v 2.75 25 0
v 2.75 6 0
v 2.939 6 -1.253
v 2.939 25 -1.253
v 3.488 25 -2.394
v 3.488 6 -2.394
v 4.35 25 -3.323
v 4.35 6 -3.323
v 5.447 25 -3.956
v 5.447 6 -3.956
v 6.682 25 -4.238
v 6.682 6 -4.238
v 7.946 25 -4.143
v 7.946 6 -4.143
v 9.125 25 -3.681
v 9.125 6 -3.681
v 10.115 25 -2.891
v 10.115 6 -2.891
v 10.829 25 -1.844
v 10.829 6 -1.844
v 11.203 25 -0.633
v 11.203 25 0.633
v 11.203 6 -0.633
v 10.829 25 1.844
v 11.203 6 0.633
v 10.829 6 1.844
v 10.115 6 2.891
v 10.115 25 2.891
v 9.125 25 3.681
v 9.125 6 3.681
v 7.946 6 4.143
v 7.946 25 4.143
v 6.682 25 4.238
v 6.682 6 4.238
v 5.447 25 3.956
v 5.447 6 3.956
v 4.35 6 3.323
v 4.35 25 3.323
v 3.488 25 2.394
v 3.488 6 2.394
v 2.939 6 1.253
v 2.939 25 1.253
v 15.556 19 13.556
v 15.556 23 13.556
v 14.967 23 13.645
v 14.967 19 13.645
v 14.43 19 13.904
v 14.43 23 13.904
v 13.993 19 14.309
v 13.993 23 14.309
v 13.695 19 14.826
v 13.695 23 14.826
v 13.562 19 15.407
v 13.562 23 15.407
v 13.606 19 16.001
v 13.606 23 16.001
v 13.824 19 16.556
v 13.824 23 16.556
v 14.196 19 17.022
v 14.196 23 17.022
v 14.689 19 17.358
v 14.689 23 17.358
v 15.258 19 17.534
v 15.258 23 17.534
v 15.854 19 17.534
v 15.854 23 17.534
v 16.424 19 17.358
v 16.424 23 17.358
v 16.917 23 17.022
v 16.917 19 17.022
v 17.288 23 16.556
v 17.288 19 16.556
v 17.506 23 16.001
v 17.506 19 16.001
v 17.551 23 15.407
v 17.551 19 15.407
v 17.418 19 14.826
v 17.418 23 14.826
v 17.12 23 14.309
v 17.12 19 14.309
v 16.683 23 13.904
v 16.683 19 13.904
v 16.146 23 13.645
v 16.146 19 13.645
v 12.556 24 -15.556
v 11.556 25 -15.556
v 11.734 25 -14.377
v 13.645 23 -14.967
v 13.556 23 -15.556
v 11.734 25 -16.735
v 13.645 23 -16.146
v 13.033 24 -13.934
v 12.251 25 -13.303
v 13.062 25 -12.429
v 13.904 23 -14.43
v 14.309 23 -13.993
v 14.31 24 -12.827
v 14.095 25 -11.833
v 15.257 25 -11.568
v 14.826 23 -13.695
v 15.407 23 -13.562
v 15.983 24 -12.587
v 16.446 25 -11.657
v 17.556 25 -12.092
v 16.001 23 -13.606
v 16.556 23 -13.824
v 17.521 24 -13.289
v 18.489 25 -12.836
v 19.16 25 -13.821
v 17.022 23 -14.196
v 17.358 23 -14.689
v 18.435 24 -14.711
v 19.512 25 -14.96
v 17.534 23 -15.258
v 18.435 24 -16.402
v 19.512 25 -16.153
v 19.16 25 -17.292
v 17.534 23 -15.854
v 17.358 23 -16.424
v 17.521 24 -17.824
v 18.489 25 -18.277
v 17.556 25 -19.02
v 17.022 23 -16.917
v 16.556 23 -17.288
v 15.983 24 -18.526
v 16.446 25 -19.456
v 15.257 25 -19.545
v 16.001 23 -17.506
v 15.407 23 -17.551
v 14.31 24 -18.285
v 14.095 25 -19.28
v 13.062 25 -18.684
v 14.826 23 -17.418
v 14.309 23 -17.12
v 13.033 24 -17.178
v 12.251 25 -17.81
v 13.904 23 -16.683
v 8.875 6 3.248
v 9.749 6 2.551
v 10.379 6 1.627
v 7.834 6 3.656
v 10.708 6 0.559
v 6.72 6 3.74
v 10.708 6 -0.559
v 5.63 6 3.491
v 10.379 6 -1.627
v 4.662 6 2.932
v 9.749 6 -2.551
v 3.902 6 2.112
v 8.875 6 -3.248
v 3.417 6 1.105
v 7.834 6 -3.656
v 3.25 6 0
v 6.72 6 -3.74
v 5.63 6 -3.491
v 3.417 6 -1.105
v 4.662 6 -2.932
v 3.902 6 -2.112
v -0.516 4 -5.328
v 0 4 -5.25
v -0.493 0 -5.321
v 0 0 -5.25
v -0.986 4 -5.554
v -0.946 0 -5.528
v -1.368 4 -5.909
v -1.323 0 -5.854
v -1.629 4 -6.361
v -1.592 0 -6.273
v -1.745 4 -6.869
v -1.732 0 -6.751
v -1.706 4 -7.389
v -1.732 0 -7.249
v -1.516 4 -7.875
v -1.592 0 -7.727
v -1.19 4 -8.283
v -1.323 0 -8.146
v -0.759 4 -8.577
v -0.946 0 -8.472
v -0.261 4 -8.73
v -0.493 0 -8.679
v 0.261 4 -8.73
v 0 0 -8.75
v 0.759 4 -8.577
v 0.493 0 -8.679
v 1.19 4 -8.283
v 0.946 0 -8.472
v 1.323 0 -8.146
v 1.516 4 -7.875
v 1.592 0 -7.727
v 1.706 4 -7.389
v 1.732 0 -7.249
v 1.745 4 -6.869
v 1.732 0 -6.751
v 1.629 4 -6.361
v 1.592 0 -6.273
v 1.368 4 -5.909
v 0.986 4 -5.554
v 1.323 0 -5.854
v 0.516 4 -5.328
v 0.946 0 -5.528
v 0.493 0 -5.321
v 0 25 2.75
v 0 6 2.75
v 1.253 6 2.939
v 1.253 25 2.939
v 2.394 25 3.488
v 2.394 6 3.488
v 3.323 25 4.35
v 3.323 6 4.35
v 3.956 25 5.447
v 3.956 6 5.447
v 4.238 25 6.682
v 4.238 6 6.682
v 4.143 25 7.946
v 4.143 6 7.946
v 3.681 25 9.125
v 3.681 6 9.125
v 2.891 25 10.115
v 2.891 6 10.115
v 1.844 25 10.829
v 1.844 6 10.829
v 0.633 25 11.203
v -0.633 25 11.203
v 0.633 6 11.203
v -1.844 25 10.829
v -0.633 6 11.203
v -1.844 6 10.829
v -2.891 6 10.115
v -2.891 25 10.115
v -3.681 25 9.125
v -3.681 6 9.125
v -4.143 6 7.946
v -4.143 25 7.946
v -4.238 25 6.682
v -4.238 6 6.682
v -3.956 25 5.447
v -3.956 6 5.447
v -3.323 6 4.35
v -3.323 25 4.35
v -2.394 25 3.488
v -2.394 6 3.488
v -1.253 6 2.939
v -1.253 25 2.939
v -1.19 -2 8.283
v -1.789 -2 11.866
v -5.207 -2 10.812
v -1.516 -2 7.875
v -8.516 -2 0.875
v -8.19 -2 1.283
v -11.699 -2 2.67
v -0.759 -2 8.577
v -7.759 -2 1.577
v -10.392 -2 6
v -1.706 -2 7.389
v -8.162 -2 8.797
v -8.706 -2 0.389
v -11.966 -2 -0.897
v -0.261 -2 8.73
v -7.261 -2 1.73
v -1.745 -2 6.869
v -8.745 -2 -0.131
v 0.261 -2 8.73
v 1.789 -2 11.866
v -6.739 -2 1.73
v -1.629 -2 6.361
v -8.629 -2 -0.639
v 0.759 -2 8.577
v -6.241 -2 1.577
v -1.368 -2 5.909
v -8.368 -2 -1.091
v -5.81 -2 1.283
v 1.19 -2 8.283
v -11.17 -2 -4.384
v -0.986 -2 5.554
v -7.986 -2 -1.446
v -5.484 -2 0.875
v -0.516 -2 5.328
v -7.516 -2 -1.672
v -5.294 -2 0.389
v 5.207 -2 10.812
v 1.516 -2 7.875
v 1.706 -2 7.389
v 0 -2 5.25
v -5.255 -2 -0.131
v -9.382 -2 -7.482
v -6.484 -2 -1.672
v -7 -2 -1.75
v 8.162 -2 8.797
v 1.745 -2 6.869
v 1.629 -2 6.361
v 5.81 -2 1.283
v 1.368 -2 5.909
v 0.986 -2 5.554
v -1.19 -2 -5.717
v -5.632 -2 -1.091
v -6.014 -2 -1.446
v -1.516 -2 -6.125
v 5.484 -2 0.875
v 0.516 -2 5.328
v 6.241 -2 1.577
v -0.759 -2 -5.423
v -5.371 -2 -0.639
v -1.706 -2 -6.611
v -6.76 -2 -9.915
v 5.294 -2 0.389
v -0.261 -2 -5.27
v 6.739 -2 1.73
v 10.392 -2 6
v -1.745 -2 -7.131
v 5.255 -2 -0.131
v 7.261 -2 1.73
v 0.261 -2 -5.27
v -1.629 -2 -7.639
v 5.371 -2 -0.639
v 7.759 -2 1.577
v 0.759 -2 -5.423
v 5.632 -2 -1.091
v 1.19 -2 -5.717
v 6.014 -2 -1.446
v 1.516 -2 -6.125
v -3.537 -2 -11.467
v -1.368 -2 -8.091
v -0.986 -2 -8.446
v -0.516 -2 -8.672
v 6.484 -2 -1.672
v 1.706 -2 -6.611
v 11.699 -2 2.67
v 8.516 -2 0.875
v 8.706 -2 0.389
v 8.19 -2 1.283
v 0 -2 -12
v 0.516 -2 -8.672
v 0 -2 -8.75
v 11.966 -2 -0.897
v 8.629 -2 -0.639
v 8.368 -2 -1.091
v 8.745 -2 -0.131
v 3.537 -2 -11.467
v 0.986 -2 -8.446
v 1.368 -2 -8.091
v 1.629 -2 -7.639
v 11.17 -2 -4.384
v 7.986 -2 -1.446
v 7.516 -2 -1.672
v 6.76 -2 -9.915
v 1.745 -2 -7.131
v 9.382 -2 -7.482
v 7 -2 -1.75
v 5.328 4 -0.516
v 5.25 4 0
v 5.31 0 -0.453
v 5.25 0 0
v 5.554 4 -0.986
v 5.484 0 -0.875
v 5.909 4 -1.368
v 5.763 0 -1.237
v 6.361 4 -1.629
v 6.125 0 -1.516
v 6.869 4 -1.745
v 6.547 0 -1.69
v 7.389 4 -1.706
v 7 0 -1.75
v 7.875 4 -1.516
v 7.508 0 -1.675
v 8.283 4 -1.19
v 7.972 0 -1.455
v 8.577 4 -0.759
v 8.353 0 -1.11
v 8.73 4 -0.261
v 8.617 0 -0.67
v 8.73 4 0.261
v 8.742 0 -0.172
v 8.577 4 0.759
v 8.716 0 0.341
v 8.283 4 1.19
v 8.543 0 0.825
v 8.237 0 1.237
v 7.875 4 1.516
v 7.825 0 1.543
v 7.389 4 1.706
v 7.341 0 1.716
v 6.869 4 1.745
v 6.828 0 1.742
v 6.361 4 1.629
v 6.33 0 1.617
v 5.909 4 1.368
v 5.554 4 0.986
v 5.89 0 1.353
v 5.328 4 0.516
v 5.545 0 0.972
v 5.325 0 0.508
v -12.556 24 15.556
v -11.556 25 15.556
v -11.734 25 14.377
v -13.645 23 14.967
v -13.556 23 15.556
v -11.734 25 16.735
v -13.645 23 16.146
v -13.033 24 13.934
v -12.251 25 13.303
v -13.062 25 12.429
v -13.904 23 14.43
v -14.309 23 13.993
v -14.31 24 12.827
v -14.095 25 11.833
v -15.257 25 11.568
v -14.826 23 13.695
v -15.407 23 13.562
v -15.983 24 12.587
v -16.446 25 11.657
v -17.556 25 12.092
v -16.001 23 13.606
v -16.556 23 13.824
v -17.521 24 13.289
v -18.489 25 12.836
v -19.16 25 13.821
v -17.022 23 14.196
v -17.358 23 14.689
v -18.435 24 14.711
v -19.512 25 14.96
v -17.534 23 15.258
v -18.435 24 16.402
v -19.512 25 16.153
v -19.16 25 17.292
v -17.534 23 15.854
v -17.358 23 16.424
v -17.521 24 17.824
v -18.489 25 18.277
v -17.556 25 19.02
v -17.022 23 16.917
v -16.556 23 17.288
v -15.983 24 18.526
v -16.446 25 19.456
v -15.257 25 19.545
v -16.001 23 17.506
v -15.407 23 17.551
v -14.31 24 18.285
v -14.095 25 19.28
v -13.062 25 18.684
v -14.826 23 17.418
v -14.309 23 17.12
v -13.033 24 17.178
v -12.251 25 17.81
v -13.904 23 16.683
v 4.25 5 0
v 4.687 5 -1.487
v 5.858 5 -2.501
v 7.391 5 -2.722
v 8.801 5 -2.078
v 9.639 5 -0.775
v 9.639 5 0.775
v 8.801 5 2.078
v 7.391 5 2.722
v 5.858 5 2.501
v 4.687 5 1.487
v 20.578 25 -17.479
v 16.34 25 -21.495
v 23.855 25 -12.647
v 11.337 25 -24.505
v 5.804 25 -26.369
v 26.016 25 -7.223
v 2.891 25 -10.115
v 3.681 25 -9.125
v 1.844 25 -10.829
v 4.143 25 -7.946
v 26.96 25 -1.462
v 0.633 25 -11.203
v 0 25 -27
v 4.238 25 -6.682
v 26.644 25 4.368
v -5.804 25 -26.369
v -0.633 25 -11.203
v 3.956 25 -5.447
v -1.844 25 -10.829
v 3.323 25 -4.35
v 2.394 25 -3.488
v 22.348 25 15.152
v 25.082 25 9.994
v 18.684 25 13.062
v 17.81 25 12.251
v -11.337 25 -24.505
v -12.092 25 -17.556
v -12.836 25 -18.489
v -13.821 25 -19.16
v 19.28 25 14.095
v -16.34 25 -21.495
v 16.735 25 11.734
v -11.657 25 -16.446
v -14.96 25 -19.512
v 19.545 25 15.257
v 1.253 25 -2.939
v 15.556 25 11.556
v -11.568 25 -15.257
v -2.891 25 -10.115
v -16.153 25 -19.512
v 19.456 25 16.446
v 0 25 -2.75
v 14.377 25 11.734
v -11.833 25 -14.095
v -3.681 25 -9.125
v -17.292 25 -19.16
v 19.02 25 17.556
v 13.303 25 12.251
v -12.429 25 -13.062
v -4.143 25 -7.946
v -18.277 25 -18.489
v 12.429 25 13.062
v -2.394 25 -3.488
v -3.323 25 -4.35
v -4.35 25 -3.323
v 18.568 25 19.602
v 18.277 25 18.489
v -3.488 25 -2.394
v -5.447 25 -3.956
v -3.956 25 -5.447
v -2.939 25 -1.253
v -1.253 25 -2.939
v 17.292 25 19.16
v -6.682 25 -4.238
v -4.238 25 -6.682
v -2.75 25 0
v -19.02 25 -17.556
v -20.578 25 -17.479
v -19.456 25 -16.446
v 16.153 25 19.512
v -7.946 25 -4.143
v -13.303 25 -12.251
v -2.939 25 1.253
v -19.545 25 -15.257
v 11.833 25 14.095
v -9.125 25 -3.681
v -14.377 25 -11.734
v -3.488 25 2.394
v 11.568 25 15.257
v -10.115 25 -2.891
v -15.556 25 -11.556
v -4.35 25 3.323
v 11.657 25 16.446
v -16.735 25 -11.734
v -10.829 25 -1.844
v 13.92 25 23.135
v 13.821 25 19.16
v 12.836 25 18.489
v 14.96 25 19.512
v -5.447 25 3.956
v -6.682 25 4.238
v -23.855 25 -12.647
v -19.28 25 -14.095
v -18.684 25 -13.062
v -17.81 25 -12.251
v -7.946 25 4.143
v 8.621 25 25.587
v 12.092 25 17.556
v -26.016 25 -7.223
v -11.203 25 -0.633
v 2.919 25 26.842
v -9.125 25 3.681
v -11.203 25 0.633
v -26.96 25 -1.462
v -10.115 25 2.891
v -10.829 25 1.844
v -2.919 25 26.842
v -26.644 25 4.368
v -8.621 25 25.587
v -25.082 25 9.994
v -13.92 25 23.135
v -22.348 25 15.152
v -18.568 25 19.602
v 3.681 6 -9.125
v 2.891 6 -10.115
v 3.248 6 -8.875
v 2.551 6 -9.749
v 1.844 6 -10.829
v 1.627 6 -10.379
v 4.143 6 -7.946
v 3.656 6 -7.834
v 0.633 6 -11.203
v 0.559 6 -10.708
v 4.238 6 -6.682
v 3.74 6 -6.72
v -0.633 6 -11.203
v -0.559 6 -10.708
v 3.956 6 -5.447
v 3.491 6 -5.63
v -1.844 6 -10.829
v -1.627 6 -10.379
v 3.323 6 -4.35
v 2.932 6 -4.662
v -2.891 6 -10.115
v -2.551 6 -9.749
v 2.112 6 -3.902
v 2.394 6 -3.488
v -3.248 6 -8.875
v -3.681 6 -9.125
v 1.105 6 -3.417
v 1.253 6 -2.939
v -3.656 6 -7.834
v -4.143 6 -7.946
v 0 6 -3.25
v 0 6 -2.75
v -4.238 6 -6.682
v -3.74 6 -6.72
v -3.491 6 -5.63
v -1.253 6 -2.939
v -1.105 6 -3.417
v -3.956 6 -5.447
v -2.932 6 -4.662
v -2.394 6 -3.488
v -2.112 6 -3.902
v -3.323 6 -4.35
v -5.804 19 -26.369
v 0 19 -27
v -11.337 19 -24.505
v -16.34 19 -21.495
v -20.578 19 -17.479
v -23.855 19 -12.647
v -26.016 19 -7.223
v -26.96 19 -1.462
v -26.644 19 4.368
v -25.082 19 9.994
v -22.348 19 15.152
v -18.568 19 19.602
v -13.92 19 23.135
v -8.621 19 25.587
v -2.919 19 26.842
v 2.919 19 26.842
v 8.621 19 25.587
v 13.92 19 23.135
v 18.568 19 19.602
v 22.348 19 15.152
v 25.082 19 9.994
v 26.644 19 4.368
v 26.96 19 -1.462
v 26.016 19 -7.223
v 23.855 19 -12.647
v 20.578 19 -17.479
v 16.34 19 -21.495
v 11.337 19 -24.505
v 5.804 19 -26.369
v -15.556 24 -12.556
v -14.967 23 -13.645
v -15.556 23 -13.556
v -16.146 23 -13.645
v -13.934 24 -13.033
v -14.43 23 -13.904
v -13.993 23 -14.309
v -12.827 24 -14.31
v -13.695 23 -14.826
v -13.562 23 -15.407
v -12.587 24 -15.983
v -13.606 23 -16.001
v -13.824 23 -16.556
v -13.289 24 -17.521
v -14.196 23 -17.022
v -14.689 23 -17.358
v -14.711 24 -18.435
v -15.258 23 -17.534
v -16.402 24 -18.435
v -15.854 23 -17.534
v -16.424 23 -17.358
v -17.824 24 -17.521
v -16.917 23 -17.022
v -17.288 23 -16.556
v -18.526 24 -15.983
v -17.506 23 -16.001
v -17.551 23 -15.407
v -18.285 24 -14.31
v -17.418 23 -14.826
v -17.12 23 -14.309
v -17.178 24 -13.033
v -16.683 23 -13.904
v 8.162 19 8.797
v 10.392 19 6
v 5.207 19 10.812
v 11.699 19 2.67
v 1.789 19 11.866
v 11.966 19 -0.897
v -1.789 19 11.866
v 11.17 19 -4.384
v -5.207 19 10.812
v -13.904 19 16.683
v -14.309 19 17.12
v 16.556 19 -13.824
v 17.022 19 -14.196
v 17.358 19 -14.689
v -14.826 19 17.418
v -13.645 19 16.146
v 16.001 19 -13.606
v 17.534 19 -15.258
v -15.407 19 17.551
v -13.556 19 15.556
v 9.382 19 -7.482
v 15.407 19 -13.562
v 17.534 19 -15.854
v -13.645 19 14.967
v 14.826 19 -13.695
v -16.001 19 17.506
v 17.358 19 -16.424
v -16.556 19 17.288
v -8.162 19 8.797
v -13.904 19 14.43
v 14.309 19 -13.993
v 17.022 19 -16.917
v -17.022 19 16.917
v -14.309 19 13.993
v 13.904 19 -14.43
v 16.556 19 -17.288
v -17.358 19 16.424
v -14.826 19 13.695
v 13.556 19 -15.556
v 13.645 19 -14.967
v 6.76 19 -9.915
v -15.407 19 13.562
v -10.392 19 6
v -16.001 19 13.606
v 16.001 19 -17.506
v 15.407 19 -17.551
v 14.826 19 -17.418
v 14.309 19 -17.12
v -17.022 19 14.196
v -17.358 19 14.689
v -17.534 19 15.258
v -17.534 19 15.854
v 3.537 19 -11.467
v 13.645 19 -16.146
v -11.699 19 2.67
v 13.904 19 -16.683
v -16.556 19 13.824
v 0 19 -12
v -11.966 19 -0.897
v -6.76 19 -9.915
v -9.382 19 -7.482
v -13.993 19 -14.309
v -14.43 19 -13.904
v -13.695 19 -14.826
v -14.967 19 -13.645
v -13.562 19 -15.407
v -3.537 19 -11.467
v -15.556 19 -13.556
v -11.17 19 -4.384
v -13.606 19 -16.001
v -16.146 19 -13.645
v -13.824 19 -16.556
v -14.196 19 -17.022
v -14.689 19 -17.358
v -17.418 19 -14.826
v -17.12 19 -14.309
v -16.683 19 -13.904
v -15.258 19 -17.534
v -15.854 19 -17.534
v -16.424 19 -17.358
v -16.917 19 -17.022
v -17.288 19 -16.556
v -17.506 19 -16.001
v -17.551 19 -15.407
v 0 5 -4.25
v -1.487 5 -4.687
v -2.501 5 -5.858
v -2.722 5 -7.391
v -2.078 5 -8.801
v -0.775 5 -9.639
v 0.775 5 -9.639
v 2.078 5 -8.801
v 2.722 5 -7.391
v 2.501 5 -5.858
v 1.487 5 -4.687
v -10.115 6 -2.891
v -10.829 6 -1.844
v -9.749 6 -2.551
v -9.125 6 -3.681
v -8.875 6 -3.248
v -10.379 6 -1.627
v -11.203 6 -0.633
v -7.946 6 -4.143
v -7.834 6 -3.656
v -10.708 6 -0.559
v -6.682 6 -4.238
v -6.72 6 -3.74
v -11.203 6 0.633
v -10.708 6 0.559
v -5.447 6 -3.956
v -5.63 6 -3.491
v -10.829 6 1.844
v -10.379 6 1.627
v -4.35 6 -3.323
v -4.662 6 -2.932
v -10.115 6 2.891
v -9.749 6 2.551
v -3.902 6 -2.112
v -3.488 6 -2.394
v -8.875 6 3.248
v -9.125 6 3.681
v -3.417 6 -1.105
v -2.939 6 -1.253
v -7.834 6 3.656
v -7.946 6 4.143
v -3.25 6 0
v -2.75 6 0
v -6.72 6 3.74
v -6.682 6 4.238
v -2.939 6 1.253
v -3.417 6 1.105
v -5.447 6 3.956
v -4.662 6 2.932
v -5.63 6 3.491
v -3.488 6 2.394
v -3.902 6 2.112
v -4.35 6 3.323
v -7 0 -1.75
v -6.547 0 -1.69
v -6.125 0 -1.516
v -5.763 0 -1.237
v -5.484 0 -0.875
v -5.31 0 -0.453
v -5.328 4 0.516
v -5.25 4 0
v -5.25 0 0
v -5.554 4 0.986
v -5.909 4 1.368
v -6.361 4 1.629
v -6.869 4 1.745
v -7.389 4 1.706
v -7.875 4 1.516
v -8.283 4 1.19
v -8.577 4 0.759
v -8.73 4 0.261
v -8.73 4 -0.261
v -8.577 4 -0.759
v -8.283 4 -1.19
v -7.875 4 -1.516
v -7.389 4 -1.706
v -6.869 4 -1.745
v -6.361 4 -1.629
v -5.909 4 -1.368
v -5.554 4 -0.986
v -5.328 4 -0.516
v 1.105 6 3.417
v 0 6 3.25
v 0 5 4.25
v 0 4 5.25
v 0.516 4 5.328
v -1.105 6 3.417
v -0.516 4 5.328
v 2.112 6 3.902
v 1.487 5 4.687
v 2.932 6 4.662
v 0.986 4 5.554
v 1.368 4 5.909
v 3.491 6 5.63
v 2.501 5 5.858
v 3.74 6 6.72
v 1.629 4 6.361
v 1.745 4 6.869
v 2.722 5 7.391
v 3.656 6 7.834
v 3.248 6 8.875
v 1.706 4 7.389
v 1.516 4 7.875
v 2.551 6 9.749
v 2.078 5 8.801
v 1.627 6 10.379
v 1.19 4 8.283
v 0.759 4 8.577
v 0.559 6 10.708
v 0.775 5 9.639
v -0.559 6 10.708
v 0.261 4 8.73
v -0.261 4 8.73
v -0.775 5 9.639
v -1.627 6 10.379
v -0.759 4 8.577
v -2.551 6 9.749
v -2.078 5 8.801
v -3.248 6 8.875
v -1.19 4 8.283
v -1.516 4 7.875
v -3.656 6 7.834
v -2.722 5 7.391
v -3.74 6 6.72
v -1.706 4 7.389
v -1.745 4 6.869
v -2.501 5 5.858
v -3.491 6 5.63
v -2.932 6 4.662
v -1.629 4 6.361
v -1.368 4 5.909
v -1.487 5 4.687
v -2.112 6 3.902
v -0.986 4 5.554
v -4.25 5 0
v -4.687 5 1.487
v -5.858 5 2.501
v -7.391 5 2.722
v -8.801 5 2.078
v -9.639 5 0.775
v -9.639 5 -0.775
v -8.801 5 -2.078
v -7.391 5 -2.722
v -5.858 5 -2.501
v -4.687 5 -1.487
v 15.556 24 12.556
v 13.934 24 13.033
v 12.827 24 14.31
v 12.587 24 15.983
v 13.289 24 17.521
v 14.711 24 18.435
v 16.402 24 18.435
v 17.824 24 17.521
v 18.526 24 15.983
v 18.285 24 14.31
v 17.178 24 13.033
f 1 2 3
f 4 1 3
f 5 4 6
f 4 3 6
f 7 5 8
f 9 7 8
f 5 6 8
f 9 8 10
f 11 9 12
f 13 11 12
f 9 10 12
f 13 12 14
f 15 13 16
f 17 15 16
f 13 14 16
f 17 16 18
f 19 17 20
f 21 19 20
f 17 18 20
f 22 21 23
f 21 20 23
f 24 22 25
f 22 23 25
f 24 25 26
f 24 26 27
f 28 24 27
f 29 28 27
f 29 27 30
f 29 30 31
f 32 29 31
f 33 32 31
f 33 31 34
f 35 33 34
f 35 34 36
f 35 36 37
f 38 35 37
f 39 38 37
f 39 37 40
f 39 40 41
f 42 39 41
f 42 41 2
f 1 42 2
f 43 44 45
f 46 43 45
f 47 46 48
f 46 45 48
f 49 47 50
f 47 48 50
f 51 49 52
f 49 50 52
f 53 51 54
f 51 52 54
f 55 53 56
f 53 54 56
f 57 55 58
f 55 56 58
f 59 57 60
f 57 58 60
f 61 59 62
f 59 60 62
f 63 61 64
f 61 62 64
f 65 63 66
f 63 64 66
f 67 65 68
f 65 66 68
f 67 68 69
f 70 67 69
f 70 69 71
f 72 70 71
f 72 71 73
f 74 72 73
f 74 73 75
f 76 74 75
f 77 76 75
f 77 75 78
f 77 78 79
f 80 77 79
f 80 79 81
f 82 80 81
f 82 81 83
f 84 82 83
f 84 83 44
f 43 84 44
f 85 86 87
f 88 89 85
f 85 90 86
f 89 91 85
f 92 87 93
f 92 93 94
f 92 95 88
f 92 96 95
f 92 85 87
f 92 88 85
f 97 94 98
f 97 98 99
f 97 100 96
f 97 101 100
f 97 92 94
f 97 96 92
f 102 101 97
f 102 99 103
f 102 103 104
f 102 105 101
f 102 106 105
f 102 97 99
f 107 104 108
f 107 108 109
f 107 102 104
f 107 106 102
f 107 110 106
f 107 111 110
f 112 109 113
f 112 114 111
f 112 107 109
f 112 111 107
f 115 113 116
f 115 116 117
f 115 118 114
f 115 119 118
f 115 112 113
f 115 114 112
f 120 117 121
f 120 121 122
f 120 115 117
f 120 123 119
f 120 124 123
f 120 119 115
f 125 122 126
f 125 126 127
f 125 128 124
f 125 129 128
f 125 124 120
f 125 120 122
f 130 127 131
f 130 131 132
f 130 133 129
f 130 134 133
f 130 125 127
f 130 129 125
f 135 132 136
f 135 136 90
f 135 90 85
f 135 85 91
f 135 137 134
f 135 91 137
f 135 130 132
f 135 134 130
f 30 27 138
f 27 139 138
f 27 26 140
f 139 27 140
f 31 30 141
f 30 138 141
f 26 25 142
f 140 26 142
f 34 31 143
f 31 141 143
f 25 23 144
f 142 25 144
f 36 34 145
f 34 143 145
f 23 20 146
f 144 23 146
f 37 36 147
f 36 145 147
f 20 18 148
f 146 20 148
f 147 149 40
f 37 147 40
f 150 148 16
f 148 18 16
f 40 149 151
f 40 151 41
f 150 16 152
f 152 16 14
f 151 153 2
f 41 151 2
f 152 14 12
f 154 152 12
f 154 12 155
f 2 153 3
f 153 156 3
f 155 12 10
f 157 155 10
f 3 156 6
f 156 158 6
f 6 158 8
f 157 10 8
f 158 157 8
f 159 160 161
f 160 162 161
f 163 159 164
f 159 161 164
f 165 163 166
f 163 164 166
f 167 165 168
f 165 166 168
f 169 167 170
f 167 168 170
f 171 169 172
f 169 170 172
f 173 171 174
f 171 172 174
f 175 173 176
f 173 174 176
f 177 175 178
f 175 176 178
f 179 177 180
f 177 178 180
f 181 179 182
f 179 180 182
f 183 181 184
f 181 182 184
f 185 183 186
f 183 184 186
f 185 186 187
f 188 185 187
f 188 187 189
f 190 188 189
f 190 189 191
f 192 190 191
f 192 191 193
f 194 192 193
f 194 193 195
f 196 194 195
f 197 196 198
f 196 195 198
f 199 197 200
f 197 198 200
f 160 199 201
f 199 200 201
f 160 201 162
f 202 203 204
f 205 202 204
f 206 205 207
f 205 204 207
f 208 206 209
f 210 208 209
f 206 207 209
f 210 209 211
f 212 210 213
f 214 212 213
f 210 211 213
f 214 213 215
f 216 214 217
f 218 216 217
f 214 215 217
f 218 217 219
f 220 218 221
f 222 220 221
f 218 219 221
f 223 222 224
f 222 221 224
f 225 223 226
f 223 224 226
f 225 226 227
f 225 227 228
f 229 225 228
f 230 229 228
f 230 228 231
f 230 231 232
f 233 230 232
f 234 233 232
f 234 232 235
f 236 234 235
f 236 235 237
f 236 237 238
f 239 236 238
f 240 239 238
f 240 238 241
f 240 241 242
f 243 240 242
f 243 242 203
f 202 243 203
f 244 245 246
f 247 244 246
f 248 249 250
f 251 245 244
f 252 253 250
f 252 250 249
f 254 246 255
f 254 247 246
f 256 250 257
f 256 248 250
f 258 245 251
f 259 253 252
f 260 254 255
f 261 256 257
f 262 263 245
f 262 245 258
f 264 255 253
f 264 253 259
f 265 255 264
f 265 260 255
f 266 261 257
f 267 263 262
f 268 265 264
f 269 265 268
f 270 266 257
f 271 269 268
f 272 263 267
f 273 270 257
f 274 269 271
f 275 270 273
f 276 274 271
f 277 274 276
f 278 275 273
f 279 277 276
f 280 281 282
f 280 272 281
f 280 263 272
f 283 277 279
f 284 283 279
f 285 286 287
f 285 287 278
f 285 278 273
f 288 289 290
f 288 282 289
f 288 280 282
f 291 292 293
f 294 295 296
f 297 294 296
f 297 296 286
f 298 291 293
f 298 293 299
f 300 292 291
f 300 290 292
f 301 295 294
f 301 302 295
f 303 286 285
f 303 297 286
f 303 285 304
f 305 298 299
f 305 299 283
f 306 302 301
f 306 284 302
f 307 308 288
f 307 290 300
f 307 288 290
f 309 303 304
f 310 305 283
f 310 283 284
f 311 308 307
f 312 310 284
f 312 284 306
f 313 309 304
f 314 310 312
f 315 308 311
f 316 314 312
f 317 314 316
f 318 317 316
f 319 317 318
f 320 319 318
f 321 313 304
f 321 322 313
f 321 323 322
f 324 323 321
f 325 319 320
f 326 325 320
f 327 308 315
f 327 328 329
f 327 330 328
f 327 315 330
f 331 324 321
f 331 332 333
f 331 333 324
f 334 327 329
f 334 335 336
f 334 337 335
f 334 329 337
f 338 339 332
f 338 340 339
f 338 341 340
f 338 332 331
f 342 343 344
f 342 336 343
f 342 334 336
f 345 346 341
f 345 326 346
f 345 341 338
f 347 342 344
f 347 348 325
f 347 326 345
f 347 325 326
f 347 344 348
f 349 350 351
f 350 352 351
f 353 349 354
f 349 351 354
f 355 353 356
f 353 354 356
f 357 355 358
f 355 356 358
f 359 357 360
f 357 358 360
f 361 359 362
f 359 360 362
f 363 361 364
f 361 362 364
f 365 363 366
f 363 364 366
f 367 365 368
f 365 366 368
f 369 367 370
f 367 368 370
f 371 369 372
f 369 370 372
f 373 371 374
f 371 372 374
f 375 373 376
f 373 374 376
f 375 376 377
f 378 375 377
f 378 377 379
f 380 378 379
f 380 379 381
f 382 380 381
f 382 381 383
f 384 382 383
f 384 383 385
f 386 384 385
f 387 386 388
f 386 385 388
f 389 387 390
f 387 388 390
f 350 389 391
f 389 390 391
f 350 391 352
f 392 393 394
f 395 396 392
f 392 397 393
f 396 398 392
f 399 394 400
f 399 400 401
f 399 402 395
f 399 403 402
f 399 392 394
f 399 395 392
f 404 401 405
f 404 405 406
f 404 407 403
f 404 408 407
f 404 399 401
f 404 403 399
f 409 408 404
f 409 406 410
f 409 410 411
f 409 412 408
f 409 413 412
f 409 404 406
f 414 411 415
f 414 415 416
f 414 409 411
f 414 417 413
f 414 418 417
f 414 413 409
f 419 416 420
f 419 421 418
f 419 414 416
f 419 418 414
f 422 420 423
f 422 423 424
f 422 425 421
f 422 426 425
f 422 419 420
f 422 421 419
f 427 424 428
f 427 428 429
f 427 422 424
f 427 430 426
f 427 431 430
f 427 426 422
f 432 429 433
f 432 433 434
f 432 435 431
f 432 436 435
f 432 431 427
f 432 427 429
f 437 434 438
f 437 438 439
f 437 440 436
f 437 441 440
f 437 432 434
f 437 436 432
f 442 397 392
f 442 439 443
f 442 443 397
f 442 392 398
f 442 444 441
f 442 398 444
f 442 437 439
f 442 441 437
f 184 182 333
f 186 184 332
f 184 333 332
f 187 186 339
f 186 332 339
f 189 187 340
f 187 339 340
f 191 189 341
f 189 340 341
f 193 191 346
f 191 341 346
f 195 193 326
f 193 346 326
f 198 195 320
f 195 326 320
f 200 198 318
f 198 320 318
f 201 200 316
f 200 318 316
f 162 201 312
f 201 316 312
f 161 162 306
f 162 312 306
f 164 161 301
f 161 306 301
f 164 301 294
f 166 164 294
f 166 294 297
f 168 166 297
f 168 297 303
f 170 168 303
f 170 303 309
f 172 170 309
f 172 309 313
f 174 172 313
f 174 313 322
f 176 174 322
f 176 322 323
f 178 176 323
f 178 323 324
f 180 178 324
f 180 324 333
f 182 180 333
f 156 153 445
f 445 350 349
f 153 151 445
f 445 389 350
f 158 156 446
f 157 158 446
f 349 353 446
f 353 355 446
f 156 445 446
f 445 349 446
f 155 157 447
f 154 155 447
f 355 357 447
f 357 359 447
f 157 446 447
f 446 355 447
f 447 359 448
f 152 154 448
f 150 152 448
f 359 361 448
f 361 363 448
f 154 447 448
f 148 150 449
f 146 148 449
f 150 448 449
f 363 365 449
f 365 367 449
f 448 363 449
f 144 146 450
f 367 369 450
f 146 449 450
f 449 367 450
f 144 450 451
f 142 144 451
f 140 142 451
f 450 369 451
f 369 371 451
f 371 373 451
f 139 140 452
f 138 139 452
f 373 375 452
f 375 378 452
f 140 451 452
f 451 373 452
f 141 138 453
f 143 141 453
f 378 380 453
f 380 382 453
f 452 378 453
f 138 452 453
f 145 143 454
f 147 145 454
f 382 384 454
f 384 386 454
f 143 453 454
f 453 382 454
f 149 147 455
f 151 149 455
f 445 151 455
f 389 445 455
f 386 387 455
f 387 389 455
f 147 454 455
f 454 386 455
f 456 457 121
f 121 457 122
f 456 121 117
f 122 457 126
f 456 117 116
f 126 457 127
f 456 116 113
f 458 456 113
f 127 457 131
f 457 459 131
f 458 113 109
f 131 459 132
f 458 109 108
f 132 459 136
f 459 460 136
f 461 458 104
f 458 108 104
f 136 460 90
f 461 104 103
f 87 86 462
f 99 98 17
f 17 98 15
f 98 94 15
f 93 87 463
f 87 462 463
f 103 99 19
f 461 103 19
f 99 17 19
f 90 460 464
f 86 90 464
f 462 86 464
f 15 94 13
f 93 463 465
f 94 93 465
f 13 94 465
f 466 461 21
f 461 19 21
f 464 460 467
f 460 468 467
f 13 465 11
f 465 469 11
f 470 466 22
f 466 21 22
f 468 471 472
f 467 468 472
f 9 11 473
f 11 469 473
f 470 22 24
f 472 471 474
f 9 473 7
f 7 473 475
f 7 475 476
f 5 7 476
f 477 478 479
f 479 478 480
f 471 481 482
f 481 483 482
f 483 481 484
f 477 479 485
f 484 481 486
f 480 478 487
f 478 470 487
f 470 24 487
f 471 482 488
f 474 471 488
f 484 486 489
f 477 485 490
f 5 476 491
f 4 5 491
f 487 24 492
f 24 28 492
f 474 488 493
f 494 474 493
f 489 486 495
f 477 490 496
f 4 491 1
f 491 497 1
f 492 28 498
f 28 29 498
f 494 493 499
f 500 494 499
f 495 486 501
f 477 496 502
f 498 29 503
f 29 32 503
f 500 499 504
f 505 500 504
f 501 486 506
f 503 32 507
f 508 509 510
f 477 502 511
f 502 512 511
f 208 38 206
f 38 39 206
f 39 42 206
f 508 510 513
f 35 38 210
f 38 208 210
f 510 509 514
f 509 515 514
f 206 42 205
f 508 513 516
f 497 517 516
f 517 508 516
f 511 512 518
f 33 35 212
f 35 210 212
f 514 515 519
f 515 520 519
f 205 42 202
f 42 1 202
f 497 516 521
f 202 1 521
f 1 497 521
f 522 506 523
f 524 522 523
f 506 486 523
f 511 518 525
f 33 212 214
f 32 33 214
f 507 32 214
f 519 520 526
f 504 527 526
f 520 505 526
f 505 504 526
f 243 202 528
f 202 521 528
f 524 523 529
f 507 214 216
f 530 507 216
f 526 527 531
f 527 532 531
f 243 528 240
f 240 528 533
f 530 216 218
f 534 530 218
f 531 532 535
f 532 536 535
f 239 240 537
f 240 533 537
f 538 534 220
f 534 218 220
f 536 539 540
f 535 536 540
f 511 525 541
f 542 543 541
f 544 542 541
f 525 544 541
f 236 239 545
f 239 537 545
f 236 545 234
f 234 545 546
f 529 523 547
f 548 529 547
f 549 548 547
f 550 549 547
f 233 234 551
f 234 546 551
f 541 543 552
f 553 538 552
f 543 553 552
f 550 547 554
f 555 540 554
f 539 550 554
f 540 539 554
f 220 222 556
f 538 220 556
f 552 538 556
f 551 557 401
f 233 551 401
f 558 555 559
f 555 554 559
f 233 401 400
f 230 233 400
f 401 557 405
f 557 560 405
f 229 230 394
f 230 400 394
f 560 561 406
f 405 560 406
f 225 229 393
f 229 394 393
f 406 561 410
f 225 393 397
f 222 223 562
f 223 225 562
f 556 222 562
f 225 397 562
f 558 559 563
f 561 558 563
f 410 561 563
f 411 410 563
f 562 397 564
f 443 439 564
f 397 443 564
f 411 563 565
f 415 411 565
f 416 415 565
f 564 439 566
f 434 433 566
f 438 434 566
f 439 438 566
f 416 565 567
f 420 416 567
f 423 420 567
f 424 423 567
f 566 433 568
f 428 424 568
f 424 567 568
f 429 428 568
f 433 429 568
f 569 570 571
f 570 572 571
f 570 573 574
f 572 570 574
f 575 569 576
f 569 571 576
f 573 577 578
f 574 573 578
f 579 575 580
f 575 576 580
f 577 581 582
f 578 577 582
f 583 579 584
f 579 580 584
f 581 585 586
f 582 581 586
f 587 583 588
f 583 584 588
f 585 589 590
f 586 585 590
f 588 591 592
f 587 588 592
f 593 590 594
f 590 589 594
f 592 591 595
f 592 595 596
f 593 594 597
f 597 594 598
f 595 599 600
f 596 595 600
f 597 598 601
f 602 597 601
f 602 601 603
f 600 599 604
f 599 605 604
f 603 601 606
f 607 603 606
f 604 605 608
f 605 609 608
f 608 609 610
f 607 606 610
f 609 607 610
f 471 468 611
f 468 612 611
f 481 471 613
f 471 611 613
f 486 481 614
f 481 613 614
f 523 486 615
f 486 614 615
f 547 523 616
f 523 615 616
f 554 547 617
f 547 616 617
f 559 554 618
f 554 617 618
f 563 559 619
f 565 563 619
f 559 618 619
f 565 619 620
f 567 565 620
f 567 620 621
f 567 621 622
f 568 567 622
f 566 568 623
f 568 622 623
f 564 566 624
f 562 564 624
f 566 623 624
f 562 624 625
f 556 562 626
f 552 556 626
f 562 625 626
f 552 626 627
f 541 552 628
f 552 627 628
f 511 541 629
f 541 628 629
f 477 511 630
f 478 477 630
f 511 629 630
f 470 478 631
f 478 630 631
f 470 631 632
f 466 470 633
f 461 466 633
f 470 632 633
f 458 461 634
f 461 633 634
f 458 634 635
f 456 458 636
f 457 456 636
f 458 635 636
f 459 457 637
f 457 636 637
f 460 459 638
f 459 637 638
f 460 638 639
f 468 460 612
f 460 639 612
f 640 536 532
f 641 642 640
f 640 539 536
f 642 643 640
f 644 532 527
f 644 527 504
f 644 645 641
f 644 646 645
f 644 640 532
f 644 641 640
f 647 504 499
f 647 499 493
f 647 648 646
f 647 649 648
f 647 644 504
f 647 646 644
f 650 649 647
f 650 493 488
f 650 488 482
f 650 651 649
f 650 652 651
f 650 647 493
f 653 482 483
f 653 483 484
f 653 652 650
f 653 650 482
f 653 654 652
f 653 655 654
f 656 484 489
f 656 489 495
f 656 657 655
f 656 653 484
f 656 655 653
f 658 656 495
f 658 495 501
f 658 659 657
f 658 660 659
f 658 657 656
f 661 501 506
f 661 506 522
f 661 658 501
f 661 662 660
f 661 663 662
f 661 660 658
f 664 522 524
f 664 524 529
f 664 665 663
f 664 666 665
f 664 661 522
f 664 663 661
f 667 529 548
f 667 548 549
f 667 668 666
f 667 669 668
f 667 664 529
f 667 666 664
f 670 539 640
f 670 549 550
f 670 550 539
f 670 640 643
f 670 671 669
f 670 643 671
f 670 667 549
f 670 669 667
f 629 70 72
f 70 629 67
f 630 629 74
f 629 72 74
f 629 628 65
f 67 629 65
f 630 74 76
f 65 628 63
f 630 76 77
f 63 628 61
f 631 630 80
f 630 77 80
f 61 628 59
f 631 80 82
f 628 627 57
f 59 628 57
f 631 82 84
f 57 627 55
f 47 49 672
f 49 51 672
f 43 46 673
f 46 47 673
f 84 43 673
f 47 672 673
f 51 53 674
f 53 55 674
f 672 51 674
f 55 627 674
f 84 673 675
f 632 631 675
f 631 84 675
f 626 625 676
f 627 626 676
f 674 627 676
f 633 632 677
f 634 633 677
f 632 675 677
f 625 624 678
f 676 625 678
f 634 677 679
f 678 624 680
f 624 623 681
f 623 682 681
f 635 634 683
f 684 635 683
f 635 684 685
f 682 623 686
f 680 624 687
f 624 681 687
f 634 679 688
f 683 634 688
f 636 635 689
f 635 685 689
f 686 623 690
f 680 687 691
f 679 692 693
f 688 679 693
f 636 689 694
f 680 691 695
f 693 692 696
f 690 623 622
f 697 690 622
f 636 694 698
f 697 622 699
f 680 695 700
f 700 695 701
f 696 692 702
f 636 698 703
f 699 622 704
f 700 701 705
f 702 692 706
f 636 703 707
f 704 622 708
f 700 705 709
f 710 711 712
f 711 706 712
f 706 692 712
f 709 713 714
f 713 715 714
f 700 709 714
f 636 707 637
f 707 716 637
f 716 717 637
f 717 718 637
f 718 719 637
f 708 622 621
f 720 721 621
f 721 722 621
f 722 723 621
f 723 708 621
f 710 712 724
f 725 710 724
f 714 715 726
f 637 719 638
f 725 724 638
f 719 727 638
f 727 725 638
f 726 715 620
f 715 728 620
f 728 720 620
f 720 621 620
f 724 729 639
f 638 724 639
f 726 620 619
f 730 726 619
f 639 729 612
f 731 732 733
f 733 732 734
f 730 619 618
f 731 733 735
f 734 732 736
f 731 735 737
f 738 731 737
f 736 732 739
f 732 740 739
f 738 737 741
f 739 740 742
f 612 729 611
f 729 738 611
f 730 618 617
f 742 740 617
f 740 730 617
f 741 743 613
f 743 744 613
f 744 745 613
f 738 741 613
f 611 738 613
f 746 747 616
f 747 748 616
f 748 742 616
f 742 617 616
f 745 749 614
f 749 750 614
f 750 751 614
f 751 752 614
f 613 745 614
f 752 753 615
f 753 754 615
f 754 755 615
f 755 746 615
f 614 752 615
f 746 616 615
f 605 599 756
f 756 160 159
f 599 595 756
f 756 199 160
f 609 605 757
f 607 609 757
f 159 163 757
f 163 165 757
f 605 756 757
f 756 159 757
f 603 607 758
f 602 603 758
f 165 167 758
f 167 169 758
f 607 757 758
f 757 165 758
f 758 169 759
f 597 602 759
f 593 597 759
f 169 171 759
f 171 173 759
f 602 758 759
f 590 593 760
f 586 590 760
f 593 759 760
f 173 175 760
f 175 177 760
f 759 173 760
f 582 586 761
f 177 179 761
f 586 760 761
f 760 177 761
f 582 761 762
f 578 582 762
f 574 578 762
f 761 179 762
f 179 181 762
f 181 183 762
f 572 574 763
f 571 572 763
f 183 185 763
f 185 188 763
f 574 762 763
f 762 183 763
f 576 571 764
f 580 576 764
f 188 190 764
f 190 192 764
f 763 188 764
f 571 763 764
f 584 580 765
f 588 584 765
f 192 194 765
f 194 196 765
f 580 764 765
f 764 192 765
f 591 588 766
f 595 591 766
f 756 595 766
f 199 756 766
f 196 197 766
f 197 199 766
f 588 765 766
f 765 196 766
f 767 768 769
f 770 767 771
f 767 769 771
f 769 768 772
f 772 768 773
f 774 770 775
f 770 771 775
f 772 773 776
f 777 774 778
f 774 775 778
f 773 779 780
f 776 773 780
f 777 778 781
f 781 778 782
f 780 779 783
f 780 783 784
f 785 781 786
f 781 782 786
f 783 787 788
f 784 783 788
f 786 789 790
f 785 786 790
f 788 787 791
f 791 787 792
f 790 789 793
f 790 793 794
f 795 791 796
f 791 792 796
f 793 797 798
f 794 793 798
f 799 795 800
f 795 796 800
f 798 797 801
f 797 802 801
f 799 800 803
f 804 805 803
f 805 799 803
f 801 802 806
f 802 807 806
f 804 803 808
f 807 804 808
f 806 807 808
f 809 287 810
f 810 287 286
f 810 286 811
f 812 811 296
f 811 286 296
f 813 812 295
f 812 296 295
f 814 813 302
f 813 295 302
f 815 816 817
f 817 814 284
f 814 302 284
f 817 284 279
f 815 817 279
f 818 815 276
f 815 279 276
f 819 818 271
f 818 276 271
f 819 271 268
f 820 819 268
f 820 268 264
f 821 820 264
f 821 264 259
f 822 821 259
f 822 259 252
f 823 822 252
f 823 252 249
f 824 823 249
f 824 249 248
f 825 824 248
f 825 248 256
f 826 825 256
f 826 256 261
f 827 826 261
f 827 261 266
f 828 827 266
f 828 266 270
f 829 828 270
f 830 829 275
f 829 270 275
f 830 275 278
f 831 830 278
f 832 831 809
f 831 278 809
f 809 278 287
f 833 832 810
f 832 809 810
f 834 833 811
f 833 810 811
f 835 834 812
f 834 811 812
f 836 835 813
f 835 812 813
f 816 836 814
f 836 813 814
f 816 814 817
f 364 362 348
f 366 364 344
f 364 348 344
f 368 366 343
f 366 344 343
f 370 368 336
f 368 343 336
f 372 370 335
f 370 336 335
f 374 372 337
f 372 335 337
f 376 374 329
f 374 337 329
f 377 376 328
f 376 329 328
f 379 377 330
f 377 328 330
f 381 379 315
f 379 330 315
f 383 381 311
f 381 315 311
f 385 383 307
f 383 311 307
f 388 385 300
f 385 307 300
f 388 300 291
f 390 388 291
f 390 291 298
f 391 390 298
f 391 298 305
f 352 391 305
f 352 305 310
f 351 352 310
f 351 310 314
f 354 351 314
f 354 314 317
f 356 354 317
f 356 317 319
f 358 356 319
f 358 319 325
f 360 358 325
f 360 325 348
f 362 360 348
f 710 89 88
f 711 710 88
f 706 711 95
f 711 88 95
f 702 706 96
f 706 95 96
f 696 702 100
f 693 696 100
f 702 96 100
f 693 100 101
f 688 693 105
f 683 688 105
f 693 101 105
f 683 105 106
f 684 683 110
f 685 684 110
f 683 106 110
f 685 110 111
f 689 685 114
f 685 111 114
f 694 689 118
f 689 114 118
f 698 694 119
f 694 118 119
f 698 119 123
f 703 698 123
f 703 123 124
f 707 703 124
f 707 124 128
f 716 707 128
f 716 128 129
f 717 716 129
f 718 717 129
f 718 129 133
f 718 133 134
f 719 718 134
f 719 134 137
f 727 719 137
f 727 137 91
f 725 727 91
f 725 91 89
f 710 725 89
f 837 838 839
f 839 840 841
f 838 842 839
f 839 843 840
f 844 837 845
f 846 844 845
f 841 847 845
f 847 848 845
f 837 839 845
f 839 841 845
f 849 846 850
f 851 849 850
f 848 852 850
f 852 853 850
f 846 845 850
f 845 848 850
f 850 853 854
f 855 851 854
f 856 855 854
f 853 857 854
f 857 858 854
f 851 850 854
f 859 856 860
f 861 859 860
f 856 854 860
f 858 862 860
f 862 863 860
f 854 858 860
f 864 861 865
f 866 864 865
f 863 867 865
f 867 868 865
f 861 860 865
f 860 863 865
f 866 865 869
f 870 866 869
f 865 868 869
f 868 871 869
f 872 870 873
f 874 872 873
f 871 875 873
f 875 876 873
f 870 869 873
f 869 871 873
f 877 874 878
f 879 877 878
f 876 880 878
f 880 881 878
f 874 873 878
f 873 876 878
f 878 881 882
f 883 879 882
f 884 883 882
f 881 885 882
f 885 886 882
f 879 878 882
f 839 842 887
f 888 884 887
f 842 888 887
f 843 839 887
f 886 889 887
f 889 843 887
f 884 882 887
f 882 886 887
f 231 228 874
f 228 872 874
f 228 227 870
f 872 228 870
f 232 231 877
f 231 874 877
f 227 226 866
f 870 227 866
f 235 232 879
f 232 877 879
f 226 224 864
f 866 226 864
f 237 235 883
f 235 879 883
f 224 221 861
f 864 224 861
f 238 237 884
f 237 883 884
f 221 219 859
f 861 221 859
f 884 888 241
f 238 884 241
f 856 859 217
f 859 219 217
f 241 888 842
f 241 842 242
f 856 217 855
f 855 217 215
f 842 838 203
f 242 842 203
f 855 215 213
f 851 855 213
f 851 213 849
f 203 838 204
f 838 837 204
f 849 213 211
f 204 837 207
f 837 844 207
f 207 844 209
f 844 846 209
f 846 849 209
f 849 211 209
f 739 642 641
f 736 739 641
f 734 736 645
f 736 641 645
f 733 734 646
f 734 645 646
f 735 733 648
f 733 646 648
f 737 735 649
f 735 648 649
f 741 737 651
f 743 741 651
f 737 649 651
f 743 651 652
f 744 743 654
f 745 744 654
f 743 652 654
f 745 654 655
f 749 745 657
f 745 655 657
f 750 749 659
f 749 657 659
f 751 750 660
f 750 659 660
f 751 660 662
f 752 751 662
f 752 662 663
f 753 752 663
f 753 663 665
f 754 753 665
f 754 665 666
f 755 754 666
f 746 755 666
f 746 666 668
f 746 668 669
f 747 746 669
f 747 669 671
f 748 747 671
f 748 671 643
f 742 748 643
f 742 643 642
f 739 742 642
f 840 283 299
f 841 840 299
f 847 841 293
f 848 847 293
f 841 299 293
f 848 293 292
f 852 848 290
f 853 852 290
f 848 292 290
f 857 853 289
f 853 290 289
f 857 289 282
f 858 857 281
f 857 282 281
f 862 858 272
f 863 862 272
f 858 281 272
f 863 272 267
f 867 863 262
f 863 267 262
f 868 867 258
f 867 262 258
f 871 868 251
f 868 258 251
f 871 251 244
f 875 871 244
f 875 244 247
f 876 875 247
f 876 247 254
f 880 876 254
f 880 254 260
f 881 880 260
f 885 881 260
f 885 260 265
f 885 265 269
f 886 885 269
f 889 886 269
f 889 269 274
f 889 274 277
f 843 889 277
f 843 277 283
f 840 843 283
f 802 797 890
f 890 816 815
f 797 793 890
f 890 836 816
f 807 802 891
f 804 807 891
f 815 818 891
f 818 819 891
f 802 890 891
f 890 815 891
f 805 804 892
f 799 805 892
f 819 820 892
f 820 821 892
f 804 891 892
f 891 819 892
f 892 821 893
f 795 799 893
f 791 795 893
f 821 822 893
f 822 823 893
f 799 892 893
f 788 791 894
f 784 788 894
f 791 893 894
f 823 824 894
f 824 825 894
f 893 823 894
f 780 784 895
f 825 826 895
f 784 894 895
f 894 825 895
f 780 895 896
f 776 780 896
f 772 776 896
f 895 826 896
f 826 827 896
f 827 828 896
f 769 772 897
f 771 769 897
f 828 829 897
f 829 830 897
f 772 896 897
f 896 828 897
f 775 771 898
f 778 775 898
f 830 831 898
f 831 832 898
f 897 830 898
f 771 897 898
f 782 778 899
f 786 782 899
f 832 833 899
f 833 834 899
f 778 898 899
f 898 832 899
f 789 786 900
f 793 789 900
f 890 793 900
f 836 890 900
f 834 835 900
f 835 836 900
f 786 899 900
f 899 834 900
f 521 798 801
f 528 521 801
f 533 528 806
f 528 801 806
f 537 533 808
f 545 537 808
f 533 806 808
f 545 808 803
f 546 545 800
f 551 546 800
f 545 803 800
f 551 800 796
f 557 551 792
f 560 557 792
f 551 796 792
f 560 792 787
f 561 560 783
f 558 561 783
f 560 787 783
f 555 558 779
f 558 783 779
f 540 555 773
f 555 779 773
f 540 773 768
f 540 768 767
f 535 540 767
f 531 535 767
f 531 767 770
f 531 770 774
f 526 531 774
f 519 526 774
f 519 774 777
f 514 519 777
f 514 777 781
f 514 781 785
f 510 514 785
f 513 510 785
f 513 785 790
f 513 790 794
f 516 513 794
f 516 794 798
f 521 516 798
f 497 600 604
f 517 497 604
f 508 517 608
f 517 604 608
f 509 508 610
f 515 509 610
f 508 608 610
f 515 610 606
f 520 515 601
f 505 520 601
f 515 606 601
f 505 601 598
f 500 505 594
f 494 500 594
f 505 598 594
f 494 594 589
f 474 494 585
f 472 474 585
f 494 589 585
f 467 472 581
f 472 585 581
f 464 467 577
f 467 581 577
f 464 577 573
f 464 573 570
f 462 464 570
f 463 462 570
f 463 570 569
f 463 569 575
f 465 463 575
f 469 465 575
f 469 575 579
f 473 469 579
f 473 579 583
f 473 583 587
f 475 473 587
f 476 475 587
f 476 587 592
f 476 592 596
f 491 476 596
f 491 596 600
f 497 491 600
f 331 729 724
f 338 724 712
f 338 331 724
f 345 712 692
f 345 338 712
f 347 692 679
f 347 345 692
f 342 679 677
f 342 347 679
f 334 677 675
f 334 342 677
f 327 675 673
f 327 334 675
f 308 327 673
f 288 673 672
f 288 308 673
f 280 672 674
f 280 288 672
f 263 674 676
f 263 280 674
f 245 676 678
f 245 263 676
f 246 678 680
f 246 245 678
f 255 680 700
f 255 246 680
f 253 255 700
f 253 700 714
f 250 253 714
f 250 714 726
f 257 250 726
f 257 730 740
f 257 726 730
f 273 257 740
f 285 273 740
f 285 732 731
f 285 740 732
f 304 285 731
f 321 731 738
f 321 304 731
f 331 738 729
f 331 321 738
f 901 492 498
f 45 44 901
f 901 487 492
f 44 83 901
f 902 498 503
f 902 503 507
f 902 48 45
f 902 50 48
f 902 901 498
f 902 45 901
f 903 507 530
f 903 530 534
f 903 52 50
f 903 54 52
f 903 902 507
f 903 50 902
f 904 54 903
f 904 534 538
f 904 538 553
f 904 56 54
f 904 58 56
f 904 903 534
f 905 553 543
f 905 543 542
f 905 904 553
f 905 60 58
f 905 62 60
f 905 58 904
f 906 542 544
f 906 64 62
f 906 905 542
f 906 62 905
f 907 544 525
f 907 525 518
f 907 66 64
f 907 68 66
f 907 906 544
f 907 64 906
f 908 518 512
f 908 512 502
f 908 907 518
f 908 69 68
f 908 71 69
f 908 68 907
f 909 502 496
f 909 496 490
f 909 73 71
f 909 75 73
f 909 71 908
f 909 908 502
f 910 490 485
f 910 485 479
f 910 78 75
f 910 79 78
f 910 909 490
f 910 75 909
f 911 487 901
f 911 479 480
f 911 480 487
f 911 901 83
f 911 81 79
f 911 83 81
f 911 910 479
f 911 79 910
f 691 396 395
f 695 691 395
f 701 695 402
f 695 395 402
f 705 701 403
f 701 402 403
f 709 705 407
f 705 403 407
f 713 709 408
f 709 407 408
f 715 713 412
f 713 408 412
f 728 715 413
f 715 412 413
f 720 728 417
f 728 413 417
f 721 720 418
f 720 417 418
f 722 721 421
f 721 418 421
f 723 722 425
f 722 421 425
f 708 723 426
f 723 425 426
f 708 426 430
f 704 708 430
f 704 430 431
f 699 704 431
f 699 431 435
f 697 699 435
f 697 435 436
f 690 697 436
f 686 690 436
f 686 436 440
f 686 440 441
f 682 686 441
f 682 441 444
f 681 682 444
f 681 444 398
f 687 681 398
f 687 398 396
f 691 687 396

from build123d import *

# Parameters (mm, degrees)
ESBO_O2_R                = 1.75
CORTE_EXTRUS_O1_DEPTH    = 6
ESBO_O3_R                = 4.25
CORTE_EXTRUS_O2_DEPTH    = 43.649736224
PADR_OCIRCULAR1_COUNT    = 4
CHANFRO1_SIZE            = 2
ESBO_O4_R                = 2
CORTE_EXTRUS_O3_DEPTH    = 46.639894829
PADR_OCIRCULAR2_COUNT    = 4
CHANFRO3_SIZE            = 2
RESSALTO_EXTRUS_O2_START = 2
ESBO_O5_R                = 12
ESBO_O5_R_2              = 1.75
RESSALTO_EXTRUS_O2_DEPTH = 2


with BuildPart() as part:
    # Esboço1 → Revolução1 (revolve)
    with BuildSketch(Plane.XY, mode=Mode.PRIVATE) as revolu_o1_sk:
        Polygon((0, 0), (0, 25), (27, 25), (27, 19), (12, 19), (12, 0), align=None)
    revolve(revolu_o1_sk.sketch.rotate(Axis((0, 0, 0), (0, 1, 0)), 90), axis=Axis((0, 0, 0), (0, 1, 0)))

    # Esboço2 → Corte-extrusão1 (cut)
    with BuildSketch(Plane.XZ):
        with Locations(Location((0, 7, 0), (0, 0, 270))):
            Circle(ESBO_O2_R)
    corte_extrus_o1 = extrude(amount=-CORTE_EXTRUS_O1_DEPTH, mode=Mode.SUBTRACT)

    # Esboço3 → Corte-extrusão2 (cut, through all)
    with BuildSketch(Plane.XZ.offset(-6)):
        with Locations(Location((0, 7, 0), (0, 0, 270))):
            Circle(ESBO_O3_R)
    corte_extrus_o2 = extrude(amount=-CORTE_EXTRUS_O2_DEPTH, mode=Mode.SUBTRACT)

    # PadrãoCircular1: Corte-extrusão1, Corte-extrusão2 ×4 about axis
    padr_ocircular1_axis = Axis((0, 0, 0), (0, 1, 0))
    add([corte_extrus_o1.rotate(padr_ocircular1_axis, i * 360 / PADR_OCIRCULAR1_COUNT) for i in range(1, PADR_OCIRCULAR1_COUNT)], mode=Mode.SUBTRACT)
    add([corte_extrus_o2.rotate(padr_ocircular1_axis, i * 360 / PADR_OCIRCULAR1_COUNT) for i in range(1, PADR_OCIRCULAR1_COUNT)], mode=Mode.SUBTRACT)

    # Chanfro1
    chanfro1_edges = [part.edges().sort_by_distance(p)[0] for p in [
        (0, 6, 8.75),
        (0, 6, -8.75),
        (8.75, 6, 0),
        (-8.75, 6, 0),
    ]]
    chamfer(chanfro1_edges, length=CHANFRO1_SIZE)

    # Esboço4 → Corte-extrusão3 (cut, through all)
    with BuildSketch(Plane(origin=(0, 25, 0), x_dir=(1, 0, 0), z_dir=(0, 1, 0))):
        with Locations(Location((-15.556349186, 15.556349186, 0), (0, 0, 270))):
            Circle(ESBO_O4_R)
    corte_extrus_o3 = extrude(amount=-CORTE_EXTRUS_O3_DEPTH, mode=Mode.SUBTRACT)

    # PadrãoCircular2: Corte-extrusão3 ×4 about axis
    padr_ocircular2_axis = Axis((0, 0, 0), (0, 1, 0))
    for i in range(1, PADR_OCIRCULAR2_COUNT):
        add(corte_extrus_o3.rotate(padr_ocircular2_axis, i * 360 / PADR_OCIRCULAR2_COUNT), mode=Mode.SUBTRACT)

    # Chanfro3
    chanfro3_edges = [part.edges().sort_by_distance(p)[0] for p in [
        (-15.556349186, 25, -17.556349186),
        (17.556349186, 25, -15.556349186),
        (15.556349186, 25, 17.556349186),
        (-17.556349186, 25, 15.556349186),
    ]]
    chamfer(chanfro3_edges, length=CHANFRO3_SIZE)

    # Esboço5 → Ressalto-extrusão2 (add)
    with BuildSketch(Plane.XZ.offset(RESSALTO_EXTRUS_O2_START)):
        with Locations(Location((0, 0, 0), (0, 0, 270))):
            Circle(ESBO_O5_R)
        with Locations(Location((-7, 0, 0), (0, 0, 270))):
            Circle(ESBO_O5_R_2, mode=Mode.SUBTRACT)
        with Locations(Location((0, -7, 0), (0, 0, 270))):
            Circle(ESBO_O5_R_2, mode=Mode.SUBTRACT)
        with Locations(Location((7, 0, 0), (0, 0, 270))):
            Circle(ESBO_O5_R_2, mode=Mode.SUBTRACT)
        with Locations(Location((0, 7, 0), (0, 0, 270))):
            Circle(ESBO_O5_R_2, mode=Mode.SUBTRACT)
    extrude(amount=-RESSALTO_EXTRUS_O2_DEPTH)


solid = part.part
